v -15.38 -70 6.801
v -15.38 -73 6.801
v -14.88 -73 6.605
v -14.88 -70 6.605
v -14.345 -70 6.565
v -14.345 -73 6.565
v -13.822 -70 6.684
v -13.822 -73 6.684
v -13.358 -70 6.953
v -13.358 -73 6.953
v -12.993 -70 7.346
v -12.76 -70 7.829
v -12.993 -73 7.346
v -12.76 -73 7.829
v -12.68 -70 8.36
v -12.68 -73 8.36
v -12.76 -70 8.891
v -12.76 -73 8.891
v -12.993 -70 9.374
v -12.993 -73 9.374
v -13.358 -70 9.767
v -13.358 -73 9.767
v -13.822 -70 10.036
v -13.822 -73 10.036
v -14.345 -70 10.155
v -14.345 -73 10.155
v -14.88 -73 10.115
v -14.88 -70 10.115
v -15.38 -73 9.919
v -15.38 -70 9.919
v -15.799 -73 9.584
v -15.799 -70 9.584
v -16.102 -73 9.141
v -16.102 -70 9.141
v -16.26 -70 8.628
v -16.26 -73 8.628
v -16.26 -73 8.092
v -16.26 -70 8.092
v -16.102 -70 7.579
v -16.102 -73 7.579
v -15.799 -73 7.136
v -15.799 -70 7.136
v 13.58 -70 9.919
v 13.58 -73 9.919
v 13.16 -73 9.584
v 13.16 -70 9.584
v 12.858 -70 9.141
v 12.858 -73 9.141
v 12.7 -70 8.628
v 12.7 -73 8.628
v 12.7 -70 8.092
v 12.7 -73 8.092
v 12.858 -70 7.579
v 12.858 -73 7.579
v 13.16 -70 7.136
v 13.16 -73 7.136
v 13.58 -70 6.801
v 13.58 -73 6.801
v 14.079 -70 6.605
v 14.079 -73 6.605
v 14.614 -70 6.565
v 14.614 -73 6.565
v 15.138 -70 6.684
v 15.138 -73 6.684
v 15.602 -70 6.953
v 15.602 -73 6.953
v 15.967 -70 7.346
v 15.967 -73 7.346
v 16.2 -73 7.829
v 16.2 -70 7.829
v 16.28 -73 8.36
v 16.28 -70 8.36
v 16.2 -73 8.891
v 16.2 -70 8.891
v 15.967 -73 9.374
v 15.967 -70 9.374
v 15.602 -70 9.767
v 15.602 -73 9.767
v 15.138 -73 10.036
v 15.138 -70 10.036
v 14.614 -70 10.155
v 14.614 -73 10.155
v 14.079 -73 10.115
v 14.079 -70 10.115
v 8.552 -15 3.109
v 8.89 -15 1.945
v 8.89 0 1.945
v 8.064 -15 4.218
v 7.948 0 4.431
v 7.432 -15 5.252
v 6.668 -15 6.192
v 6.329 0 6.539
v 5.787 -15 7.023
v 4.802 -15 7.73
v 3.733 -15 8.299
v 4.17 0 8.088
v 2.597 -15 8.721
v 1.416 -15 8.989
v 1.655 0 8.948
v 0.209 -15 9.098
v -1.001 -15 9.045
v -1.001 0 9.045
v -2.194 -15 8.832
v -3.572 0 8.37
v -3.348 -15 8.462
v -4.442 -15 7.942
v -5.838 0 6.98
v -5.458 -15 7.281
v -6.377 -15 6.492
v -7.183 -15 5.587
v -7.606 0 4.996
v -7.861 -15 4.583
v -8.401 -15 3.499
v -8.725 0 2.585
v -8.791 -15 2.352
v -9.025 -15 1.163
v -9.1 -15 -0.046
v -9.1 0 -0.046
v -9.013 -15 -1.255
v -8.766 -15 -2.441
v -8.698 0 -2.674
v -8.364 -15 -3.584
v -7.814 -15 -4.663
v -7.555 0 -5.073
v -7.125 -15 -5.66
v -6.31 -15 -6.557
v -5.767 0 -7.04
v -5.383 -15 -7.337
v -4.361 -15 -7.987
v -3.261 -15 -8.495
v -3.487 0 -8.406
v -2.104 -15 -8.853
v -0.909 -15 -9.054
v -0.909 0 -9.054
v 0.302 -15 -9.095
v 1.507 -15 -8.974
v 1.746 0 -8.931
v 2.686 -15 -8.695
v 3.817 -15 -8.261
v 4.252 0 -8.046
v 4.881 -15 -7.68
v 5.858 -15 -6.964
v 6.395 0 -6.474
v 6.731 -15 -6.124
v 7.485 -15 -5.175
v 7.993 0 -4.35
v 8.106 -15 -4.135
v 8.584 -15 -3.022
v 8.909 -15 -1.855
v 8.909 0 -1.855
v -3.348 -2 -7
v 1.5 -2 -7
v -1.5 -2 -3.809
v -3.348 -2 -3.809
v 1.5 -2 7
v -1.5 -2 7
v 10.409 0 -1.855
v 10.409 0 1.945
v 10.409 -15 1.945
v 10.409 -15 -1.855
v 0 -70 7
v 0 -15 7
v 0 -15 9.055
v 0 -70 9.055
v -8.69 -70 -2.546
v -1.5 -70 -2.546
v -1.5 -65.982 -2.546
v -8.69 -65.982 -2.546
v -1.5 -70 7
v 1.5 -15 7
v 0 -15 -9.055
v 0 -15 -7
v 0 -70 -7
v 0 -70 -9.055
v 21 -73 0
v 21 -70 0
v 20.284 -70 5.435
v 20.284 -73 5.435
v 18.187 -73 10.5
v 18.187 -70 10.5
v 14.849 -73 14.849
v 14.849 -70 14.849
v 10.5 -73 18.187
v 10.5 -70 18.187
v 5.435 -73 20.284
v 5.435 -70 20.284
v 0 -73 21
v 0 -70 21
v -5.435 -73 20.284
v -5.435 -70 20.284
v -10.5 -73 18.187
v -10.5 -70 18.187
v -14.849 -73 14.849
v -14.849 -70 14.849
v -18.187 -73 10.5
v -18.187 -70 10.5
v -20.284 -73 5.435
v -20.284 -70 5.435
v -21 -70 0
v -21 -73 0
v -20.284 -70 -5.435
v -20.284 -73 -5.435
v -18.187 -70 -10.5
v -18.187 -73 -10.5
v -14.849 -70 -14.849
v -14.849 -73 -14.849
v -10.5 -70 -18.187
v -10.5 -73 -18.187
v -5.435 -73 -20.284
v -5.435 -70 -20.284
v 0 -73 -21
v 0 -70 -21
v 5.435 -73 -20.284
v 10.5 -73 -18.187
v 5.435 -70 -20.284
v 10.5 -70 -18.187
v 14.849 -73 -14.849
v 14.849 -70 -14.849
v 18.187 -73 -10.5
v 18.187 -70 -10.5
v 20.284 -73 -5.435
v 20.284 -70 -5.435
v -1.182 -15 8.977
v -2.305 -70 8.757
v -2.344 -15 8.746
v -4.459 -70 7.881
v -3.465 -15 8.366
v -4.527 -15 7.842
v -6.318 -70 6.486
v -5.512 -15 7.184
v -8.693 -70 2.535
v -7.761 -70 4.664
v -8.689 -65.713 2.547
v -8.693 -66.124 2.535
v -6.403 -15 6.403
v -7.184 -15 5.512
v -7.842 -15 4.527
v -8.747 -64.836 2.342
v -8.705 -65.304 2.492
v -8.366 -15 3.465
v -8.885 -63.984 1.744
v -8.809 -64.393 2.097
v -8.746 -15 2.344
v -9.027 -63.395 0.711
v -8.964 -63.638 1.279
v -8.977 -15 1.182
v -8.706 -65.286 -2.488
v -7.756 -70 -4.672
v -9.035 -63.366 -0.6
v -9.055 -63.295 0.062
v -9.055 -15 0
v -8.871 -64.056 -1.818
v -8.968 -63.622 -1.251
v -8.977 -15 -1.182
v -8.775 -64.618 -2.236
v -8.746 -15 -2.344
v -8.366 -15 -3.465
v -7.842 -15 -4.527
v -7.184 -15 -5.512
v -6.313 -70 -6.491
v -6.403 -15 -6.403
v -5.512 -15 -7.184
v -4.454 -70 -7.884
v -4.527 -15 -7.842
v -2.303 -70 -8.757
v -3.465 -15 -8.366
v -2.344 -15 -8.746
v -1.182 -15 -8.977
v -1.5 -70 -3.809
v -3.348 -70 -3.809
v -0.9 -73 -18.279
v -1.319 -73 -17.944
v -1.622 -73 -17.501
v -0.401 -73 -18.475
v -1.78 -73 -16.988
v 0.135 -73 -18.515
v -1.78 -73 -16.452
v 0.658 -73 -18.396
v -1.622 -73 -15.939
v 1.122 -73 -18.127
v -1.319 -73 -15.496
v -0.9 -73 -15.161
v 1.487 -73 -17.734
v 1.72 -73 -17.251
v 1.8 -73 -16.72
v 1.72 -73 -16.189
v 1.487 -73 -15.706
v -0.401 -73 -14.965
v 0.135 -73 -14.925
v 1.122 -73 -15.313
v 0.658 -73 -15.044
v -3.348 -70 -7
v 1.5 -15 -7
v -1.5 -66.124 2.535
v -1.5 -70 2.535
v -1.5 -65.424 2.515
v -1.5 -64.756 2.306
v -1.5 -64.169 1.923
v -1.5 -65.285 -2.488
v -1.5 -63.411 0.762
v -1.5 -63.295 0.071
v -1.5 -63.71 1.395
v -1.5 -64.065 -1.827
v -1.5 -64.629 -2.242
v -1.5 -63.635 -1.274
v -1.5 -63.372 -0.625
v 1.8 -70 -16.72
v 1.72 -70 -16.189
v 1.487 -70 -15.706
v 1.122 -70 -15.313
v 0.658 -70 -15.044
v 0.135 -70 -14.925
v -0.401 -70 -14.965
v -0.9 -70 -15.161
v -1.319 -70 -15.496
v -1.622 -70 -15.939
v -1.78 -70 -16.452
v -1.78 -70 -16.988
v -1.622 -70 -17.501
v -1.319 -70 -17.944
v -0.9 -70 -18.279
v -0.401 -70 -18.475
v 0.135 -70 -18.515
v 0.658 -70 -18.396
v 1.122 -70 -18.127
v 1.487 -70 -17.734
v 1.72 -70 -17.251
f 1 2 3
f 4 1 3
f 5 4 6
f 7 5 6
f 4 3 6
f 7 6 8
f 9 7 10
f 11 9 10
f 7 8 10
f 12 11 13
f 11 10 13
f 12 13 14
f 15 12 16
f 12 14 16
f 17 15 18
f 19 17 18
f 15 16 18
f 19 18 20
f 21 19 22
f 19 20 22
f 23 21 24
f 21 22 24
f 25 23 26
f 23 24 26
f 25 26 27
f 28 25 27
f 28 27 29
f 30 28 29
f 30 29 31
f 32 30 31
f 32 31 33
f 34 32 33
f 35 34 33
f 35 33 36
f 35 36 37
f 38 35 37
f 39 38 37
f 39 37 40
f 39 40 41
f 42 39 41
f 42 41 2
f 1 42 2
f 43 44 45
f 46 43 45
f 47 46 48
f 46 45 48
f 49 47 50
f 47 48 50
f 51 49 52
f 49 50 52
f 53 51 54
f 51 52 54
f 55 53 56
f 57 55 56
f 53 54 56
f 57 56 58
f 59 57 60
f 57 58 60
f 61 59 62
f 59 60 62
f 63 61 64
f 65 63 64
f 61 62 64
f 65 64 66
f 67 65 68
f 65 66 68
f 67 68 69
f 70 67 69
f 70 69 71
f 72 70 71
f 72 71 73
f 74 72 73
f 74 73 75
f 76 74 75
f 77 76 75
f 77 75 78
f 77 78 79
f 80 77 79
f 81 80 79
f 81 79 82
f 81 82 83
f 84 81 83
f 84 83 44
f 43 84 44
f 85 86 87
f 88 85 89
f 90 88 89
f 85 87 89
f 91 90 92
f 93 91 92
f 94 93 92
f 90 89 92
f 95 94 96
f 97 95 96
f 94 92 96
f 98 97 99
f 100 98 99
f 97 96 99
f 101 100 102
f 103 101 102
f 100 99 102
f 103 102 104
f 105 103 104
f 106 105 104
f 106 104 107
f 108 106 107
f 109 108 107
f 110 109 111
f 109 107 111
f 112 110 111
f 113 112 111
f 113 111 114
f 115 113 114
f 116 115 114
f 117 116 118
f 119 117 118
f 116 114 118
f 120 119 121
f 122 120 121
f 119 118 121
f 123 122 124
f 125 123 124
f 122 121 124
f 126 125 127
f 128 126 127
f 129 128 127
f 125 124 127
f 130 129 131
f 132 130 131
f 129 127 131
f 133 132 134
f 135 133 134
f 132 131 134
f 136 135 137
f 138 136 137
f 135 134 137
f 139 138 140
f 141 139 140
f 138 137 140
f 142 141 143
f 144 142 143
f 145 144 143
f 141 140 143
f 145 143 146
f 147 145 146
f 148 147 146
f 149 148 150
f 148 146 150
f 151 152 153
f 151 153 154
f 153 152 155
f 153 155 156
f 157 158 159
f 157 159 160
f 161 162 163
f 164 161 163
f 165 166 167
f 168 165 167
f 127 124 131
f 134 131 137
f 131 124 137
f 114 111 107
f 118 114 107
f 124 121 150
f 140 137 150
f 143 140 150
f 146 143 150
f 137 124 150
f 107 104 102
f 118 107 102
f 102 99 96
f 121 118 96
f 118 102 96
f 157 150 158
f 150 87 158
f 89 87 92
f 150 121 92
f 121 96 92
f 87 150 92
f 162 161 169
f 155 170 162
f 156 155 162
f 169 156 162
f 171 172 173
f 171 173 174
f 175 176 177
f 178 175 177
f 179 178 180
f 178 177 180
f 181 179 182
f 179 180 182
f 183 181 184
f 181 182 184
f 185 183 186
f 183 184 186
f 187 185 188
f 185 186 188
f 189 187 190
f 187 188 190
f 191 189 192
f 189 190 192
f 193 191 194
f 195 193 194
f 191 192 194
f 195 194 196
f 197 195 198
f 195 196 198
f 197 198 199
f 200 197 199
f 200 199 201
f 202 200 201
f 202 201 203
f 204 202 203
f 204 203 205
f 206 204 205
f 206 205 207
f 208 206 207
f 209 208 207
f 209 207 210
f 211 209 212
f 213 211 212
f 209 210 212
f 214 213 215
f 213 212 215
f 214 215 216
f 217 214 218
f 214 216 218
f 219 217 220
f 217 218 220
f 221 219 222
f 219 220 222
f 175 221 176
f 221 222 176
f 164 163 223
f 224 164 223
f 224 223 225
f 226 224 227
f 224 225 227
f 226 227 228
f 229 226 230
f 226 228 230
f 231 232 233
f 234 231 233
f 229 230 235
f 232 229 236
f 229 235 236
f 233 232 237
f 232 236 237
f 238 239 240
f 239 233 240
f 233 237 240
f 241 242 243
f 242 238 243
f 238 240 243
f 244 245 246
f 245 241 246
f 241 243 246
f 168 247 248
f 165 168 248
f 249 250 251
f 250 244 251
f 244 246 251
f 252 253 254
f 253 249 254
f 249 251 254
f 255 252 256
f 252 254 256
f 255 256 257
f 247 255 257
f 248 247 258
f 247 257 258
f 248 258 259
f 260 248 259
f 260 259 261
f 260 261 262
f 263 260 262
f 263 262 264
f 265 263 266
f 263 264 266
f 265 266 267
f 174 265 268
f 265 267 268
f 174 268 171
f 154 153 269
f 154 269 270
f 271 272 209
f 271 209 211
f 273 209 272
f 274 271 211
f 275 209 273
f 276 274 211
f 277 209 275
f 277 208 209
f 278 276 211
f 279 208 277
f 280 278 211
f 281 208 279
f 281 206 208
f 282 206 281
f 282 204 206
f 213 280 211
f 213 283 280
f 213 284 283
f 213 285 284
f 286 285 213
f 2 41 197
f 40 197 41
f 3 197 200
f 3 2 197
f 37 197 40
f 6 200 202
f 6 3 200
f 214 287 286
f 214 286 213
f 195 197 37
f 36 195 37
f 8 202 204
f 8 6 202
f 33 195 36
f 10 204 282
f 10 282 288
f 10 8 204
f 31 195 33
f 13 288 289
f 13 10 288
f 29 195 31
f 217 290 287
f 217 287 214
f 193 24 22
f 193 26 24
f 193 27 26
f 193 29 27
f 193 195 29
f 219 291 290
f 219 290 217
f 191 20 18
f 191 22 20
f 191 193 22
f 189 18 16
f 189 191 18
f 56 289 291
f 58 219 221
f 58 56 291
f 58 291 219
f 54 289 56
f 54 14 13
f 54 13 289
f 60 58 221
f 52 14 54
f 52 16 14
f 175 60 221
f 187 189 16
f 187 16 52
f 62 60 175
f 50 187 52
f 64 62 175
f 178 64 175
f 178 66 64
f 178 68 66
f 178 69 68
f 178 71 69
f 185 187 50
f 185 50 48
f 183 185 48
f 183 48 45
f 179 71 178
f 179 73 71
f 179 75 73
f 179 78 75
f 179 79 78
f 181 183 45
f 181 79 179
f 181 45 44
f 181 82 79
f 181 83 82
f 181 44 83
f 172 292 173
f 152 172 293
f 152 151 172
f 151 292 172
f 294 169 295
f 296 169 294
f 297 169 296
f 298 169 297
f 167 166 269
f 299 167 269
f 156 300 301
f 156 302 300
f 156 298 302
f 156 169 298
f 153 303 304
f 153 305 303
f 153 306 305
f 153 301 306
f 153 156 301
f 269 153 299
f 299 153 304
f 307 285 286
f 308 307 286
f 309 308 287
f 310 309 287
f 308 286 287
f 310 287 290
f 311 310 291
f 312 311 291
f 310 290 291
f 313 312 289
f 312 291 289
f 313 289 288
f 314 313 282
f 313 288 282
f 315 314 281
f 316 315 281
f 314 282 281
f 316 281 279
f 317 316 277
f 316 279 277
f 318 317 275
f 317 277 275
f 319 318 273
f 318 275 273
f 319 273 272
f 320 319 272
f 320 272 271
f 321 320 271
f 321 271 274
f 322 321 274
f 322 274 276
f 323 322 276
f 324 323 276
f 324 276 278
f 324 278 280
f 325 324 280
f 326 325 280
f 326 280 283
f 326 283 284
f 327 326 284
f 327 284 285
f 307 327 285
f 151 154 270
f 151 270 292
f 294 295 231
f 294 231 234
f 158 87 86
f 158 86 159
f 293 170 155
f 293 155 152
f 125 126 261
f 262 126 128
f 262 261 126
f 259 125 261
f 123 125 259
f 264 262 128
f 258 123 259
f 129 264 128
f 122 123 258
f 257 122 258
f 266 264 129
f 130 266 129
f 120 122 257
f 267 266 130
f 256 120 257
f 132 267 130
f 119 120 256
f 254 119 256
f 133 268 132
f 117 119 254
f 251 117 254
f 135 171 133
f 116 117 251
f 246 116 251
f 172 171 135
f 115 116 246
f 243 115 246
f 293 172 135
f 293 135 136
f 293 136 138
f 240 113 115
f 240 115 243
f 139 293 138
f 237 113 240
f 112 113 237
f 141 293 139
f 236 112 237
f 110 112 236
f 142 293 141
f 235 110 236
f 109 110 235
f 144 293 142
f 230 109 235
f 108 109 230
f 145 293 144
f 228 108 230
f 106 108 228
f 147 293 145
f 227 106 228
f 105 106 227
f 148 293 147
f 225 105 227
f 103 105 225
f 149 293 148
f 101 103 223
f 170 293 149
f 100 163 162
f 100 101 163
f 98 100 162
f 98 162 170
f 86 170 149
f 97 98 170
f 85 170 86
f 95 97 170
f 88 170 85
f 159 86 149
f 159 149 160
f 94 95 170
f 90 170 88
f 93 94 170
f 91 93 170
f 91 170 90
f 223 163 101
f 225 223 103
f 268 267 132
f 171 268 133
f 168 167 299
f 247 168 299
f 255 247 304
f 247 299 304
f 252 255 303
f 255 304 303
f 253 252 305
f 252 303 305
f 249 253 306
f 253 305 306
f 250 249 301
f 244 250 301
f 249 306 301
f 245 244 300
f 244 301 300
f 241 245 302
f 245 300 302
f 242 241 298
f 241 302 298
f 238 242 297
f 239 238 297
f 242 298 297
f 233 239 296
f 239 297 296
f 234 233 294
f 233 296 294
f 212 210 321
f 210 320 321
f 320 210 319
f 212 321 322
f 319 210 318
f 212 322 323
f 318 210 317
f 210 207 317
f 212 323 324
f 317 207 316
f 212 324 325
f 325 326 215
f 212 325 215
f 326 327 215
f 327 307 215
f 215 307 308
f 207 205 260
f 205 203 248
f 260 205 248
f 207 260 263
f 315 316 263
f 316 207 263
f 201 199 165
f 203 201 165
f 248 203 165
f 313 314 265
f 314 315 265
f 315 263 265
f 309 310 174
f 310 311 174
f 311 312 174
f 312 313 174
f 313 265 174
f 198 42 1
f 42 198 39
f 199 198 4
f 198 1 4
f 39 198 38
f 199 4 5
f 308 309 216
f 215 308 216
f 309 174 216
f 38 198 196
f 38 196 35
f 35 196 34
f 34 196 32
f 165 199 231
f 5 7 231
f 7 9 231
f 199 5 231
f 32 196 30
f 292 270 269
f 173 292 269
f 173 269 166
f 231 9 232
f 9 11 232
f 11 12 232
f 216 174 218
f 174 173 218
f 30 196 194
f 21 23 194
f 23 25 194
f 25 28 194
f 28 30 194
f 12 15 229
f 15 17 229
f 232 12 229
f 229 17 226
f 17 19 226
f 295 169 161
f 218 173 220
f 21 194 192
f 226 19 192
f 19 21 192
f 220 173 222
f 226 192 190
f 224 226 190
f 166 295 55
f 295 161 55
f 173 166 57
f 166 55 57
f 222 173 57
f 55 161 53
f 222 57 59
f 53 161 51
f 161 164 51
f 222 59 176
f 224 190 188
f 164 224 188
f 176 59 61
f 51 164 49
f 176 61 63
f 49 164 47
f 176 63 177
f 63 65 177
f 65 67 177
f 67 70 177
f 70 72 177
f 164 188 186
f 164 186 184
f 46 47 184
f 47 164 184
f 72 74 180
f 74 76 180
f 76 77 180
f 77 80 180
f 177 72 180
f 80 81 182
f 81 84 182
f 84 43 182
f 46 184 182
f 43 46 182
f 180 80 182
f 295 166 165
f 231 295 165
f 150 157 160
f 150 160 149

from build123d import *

# Parameters (mm, degrees)
PAD_DEPTH          = 15
POCKET_DEPTH       = 13
PAD001_DEPTH       = 55
POCKET001_DEPTH    = 7.601
SKETCH004_R        = 21
PAD002_DEPTH       = 3
SKETCH005_R        = 1.8
POCKET002_DEPTH    = 261.224272
POLARPATTERN_COUNT = 3


with BuildPart() as part:
    # Sketch → Pad (new body)
    with BuildSketch(Plane.XZ):
        with BuildLine():
            ThreePointArc((8.889624, 1.945402), (-9.099882, -0.046426), (8.90901, -1.854598))
            Line((10.40901, -1.854598), (8.90901, -1.854598))
            Line((10.40901, 1.945402), (10.40901, -1.854598))
            Line((8.889624, 1.945402), (10.40901, 1.945402))
        make_face()
    extrude(amount=PAD_DEPTH)

    # Sketch001 (on Face6 of Pad) → Pocket (cut)
    with BuildSketch(Plane.XZ.offset(15)):
        Polygon((-1.5, 7), (1.5, 7), (1.5, -7), (-3.348355, -7), (-3.348355, -3.808815), (-1.5, -3.808815), align=None)
    extrude(amount=-POCKET_DEPTH, mode=Mode.SUBTRACT)

    # Sketch002 (on Face5 of Pocket) → Pad001 (join)
    with BuildSketch(Plane.XZ.offset(15)):
        with BuildLine():
            Line((0, 7), (-1.5, 7))
            Line((-1.5, 7), (-1.5, -3.808815))
            Line((-1.5, -3.808815), (-3.348355, -3.808815))
            Line((-3.348355, -3.808815), (-3.348355, -7))
            Line((-3.348355, -7), (0, -7))
            Line((0, -7), (0, -9.054887))
            ThreePointArc((0, 9.054887), (-9.054887, 0), (0, -9.054887))
            Line((0, 7), (0, 9.054887))
        make_face()
    extrude(amount=PAD001_DEPTH)

    # Sketch003 (on Face19 of Pad001) → Pocket001 (cut, through all)
    with BuildSketch(Plane(origin=(-1.5, 0, 0), x_dir=(0, 0, 1), z_dir=(1, 0, 0))):
        with BuildLine():
            Line((-2.546247, 70), (-2.546247, 65.982418))
            ThreePointArc((-2.546247, 65.982418), (0.071035, 63.295116), (2.534594, 66.124008))
            Line((2.534594, 70), (2.534594, 66.124008))
            Line((-2.546247, 70), (2.534594, 70))
        make_face()
    extrude(amount=-POCKET001_DEPTH, mode=Mode.SUBTRACT)

    # Sketch004 (on Face14 of Pocket001) → Pad002 (join)
    with BuildSketch(Plane.XZ.offset(70)):
        Circle(SKETCH004_R)
    extrude(amount=PAD002_DEPTH)

    # Sketch005 (on Face3 of Pad002) → Pocket002 (cut, through all)
    with BuildSketch(Plane.XZ.offset(73)):
        with Locations((0, -16.72)):
            Circle(SKETCH005_R)
    pocket002 = extrude(amount=-POCKET002_DEPTH, mode=Mode.SUBTRACT)

    # PolarPattern: Pocket002 ×3 about axis
    polarpattern_axis = Axis((0, -73, 0), (0, -1, 0))
    for i in range(1, POLARPATTERN_COUNT):
        add(pocket002.rotate(polarpattern_axis, i * 360 / POLARPATTERN_COUNT), mode=Mode.SUBTRACT)


solid = part.part
